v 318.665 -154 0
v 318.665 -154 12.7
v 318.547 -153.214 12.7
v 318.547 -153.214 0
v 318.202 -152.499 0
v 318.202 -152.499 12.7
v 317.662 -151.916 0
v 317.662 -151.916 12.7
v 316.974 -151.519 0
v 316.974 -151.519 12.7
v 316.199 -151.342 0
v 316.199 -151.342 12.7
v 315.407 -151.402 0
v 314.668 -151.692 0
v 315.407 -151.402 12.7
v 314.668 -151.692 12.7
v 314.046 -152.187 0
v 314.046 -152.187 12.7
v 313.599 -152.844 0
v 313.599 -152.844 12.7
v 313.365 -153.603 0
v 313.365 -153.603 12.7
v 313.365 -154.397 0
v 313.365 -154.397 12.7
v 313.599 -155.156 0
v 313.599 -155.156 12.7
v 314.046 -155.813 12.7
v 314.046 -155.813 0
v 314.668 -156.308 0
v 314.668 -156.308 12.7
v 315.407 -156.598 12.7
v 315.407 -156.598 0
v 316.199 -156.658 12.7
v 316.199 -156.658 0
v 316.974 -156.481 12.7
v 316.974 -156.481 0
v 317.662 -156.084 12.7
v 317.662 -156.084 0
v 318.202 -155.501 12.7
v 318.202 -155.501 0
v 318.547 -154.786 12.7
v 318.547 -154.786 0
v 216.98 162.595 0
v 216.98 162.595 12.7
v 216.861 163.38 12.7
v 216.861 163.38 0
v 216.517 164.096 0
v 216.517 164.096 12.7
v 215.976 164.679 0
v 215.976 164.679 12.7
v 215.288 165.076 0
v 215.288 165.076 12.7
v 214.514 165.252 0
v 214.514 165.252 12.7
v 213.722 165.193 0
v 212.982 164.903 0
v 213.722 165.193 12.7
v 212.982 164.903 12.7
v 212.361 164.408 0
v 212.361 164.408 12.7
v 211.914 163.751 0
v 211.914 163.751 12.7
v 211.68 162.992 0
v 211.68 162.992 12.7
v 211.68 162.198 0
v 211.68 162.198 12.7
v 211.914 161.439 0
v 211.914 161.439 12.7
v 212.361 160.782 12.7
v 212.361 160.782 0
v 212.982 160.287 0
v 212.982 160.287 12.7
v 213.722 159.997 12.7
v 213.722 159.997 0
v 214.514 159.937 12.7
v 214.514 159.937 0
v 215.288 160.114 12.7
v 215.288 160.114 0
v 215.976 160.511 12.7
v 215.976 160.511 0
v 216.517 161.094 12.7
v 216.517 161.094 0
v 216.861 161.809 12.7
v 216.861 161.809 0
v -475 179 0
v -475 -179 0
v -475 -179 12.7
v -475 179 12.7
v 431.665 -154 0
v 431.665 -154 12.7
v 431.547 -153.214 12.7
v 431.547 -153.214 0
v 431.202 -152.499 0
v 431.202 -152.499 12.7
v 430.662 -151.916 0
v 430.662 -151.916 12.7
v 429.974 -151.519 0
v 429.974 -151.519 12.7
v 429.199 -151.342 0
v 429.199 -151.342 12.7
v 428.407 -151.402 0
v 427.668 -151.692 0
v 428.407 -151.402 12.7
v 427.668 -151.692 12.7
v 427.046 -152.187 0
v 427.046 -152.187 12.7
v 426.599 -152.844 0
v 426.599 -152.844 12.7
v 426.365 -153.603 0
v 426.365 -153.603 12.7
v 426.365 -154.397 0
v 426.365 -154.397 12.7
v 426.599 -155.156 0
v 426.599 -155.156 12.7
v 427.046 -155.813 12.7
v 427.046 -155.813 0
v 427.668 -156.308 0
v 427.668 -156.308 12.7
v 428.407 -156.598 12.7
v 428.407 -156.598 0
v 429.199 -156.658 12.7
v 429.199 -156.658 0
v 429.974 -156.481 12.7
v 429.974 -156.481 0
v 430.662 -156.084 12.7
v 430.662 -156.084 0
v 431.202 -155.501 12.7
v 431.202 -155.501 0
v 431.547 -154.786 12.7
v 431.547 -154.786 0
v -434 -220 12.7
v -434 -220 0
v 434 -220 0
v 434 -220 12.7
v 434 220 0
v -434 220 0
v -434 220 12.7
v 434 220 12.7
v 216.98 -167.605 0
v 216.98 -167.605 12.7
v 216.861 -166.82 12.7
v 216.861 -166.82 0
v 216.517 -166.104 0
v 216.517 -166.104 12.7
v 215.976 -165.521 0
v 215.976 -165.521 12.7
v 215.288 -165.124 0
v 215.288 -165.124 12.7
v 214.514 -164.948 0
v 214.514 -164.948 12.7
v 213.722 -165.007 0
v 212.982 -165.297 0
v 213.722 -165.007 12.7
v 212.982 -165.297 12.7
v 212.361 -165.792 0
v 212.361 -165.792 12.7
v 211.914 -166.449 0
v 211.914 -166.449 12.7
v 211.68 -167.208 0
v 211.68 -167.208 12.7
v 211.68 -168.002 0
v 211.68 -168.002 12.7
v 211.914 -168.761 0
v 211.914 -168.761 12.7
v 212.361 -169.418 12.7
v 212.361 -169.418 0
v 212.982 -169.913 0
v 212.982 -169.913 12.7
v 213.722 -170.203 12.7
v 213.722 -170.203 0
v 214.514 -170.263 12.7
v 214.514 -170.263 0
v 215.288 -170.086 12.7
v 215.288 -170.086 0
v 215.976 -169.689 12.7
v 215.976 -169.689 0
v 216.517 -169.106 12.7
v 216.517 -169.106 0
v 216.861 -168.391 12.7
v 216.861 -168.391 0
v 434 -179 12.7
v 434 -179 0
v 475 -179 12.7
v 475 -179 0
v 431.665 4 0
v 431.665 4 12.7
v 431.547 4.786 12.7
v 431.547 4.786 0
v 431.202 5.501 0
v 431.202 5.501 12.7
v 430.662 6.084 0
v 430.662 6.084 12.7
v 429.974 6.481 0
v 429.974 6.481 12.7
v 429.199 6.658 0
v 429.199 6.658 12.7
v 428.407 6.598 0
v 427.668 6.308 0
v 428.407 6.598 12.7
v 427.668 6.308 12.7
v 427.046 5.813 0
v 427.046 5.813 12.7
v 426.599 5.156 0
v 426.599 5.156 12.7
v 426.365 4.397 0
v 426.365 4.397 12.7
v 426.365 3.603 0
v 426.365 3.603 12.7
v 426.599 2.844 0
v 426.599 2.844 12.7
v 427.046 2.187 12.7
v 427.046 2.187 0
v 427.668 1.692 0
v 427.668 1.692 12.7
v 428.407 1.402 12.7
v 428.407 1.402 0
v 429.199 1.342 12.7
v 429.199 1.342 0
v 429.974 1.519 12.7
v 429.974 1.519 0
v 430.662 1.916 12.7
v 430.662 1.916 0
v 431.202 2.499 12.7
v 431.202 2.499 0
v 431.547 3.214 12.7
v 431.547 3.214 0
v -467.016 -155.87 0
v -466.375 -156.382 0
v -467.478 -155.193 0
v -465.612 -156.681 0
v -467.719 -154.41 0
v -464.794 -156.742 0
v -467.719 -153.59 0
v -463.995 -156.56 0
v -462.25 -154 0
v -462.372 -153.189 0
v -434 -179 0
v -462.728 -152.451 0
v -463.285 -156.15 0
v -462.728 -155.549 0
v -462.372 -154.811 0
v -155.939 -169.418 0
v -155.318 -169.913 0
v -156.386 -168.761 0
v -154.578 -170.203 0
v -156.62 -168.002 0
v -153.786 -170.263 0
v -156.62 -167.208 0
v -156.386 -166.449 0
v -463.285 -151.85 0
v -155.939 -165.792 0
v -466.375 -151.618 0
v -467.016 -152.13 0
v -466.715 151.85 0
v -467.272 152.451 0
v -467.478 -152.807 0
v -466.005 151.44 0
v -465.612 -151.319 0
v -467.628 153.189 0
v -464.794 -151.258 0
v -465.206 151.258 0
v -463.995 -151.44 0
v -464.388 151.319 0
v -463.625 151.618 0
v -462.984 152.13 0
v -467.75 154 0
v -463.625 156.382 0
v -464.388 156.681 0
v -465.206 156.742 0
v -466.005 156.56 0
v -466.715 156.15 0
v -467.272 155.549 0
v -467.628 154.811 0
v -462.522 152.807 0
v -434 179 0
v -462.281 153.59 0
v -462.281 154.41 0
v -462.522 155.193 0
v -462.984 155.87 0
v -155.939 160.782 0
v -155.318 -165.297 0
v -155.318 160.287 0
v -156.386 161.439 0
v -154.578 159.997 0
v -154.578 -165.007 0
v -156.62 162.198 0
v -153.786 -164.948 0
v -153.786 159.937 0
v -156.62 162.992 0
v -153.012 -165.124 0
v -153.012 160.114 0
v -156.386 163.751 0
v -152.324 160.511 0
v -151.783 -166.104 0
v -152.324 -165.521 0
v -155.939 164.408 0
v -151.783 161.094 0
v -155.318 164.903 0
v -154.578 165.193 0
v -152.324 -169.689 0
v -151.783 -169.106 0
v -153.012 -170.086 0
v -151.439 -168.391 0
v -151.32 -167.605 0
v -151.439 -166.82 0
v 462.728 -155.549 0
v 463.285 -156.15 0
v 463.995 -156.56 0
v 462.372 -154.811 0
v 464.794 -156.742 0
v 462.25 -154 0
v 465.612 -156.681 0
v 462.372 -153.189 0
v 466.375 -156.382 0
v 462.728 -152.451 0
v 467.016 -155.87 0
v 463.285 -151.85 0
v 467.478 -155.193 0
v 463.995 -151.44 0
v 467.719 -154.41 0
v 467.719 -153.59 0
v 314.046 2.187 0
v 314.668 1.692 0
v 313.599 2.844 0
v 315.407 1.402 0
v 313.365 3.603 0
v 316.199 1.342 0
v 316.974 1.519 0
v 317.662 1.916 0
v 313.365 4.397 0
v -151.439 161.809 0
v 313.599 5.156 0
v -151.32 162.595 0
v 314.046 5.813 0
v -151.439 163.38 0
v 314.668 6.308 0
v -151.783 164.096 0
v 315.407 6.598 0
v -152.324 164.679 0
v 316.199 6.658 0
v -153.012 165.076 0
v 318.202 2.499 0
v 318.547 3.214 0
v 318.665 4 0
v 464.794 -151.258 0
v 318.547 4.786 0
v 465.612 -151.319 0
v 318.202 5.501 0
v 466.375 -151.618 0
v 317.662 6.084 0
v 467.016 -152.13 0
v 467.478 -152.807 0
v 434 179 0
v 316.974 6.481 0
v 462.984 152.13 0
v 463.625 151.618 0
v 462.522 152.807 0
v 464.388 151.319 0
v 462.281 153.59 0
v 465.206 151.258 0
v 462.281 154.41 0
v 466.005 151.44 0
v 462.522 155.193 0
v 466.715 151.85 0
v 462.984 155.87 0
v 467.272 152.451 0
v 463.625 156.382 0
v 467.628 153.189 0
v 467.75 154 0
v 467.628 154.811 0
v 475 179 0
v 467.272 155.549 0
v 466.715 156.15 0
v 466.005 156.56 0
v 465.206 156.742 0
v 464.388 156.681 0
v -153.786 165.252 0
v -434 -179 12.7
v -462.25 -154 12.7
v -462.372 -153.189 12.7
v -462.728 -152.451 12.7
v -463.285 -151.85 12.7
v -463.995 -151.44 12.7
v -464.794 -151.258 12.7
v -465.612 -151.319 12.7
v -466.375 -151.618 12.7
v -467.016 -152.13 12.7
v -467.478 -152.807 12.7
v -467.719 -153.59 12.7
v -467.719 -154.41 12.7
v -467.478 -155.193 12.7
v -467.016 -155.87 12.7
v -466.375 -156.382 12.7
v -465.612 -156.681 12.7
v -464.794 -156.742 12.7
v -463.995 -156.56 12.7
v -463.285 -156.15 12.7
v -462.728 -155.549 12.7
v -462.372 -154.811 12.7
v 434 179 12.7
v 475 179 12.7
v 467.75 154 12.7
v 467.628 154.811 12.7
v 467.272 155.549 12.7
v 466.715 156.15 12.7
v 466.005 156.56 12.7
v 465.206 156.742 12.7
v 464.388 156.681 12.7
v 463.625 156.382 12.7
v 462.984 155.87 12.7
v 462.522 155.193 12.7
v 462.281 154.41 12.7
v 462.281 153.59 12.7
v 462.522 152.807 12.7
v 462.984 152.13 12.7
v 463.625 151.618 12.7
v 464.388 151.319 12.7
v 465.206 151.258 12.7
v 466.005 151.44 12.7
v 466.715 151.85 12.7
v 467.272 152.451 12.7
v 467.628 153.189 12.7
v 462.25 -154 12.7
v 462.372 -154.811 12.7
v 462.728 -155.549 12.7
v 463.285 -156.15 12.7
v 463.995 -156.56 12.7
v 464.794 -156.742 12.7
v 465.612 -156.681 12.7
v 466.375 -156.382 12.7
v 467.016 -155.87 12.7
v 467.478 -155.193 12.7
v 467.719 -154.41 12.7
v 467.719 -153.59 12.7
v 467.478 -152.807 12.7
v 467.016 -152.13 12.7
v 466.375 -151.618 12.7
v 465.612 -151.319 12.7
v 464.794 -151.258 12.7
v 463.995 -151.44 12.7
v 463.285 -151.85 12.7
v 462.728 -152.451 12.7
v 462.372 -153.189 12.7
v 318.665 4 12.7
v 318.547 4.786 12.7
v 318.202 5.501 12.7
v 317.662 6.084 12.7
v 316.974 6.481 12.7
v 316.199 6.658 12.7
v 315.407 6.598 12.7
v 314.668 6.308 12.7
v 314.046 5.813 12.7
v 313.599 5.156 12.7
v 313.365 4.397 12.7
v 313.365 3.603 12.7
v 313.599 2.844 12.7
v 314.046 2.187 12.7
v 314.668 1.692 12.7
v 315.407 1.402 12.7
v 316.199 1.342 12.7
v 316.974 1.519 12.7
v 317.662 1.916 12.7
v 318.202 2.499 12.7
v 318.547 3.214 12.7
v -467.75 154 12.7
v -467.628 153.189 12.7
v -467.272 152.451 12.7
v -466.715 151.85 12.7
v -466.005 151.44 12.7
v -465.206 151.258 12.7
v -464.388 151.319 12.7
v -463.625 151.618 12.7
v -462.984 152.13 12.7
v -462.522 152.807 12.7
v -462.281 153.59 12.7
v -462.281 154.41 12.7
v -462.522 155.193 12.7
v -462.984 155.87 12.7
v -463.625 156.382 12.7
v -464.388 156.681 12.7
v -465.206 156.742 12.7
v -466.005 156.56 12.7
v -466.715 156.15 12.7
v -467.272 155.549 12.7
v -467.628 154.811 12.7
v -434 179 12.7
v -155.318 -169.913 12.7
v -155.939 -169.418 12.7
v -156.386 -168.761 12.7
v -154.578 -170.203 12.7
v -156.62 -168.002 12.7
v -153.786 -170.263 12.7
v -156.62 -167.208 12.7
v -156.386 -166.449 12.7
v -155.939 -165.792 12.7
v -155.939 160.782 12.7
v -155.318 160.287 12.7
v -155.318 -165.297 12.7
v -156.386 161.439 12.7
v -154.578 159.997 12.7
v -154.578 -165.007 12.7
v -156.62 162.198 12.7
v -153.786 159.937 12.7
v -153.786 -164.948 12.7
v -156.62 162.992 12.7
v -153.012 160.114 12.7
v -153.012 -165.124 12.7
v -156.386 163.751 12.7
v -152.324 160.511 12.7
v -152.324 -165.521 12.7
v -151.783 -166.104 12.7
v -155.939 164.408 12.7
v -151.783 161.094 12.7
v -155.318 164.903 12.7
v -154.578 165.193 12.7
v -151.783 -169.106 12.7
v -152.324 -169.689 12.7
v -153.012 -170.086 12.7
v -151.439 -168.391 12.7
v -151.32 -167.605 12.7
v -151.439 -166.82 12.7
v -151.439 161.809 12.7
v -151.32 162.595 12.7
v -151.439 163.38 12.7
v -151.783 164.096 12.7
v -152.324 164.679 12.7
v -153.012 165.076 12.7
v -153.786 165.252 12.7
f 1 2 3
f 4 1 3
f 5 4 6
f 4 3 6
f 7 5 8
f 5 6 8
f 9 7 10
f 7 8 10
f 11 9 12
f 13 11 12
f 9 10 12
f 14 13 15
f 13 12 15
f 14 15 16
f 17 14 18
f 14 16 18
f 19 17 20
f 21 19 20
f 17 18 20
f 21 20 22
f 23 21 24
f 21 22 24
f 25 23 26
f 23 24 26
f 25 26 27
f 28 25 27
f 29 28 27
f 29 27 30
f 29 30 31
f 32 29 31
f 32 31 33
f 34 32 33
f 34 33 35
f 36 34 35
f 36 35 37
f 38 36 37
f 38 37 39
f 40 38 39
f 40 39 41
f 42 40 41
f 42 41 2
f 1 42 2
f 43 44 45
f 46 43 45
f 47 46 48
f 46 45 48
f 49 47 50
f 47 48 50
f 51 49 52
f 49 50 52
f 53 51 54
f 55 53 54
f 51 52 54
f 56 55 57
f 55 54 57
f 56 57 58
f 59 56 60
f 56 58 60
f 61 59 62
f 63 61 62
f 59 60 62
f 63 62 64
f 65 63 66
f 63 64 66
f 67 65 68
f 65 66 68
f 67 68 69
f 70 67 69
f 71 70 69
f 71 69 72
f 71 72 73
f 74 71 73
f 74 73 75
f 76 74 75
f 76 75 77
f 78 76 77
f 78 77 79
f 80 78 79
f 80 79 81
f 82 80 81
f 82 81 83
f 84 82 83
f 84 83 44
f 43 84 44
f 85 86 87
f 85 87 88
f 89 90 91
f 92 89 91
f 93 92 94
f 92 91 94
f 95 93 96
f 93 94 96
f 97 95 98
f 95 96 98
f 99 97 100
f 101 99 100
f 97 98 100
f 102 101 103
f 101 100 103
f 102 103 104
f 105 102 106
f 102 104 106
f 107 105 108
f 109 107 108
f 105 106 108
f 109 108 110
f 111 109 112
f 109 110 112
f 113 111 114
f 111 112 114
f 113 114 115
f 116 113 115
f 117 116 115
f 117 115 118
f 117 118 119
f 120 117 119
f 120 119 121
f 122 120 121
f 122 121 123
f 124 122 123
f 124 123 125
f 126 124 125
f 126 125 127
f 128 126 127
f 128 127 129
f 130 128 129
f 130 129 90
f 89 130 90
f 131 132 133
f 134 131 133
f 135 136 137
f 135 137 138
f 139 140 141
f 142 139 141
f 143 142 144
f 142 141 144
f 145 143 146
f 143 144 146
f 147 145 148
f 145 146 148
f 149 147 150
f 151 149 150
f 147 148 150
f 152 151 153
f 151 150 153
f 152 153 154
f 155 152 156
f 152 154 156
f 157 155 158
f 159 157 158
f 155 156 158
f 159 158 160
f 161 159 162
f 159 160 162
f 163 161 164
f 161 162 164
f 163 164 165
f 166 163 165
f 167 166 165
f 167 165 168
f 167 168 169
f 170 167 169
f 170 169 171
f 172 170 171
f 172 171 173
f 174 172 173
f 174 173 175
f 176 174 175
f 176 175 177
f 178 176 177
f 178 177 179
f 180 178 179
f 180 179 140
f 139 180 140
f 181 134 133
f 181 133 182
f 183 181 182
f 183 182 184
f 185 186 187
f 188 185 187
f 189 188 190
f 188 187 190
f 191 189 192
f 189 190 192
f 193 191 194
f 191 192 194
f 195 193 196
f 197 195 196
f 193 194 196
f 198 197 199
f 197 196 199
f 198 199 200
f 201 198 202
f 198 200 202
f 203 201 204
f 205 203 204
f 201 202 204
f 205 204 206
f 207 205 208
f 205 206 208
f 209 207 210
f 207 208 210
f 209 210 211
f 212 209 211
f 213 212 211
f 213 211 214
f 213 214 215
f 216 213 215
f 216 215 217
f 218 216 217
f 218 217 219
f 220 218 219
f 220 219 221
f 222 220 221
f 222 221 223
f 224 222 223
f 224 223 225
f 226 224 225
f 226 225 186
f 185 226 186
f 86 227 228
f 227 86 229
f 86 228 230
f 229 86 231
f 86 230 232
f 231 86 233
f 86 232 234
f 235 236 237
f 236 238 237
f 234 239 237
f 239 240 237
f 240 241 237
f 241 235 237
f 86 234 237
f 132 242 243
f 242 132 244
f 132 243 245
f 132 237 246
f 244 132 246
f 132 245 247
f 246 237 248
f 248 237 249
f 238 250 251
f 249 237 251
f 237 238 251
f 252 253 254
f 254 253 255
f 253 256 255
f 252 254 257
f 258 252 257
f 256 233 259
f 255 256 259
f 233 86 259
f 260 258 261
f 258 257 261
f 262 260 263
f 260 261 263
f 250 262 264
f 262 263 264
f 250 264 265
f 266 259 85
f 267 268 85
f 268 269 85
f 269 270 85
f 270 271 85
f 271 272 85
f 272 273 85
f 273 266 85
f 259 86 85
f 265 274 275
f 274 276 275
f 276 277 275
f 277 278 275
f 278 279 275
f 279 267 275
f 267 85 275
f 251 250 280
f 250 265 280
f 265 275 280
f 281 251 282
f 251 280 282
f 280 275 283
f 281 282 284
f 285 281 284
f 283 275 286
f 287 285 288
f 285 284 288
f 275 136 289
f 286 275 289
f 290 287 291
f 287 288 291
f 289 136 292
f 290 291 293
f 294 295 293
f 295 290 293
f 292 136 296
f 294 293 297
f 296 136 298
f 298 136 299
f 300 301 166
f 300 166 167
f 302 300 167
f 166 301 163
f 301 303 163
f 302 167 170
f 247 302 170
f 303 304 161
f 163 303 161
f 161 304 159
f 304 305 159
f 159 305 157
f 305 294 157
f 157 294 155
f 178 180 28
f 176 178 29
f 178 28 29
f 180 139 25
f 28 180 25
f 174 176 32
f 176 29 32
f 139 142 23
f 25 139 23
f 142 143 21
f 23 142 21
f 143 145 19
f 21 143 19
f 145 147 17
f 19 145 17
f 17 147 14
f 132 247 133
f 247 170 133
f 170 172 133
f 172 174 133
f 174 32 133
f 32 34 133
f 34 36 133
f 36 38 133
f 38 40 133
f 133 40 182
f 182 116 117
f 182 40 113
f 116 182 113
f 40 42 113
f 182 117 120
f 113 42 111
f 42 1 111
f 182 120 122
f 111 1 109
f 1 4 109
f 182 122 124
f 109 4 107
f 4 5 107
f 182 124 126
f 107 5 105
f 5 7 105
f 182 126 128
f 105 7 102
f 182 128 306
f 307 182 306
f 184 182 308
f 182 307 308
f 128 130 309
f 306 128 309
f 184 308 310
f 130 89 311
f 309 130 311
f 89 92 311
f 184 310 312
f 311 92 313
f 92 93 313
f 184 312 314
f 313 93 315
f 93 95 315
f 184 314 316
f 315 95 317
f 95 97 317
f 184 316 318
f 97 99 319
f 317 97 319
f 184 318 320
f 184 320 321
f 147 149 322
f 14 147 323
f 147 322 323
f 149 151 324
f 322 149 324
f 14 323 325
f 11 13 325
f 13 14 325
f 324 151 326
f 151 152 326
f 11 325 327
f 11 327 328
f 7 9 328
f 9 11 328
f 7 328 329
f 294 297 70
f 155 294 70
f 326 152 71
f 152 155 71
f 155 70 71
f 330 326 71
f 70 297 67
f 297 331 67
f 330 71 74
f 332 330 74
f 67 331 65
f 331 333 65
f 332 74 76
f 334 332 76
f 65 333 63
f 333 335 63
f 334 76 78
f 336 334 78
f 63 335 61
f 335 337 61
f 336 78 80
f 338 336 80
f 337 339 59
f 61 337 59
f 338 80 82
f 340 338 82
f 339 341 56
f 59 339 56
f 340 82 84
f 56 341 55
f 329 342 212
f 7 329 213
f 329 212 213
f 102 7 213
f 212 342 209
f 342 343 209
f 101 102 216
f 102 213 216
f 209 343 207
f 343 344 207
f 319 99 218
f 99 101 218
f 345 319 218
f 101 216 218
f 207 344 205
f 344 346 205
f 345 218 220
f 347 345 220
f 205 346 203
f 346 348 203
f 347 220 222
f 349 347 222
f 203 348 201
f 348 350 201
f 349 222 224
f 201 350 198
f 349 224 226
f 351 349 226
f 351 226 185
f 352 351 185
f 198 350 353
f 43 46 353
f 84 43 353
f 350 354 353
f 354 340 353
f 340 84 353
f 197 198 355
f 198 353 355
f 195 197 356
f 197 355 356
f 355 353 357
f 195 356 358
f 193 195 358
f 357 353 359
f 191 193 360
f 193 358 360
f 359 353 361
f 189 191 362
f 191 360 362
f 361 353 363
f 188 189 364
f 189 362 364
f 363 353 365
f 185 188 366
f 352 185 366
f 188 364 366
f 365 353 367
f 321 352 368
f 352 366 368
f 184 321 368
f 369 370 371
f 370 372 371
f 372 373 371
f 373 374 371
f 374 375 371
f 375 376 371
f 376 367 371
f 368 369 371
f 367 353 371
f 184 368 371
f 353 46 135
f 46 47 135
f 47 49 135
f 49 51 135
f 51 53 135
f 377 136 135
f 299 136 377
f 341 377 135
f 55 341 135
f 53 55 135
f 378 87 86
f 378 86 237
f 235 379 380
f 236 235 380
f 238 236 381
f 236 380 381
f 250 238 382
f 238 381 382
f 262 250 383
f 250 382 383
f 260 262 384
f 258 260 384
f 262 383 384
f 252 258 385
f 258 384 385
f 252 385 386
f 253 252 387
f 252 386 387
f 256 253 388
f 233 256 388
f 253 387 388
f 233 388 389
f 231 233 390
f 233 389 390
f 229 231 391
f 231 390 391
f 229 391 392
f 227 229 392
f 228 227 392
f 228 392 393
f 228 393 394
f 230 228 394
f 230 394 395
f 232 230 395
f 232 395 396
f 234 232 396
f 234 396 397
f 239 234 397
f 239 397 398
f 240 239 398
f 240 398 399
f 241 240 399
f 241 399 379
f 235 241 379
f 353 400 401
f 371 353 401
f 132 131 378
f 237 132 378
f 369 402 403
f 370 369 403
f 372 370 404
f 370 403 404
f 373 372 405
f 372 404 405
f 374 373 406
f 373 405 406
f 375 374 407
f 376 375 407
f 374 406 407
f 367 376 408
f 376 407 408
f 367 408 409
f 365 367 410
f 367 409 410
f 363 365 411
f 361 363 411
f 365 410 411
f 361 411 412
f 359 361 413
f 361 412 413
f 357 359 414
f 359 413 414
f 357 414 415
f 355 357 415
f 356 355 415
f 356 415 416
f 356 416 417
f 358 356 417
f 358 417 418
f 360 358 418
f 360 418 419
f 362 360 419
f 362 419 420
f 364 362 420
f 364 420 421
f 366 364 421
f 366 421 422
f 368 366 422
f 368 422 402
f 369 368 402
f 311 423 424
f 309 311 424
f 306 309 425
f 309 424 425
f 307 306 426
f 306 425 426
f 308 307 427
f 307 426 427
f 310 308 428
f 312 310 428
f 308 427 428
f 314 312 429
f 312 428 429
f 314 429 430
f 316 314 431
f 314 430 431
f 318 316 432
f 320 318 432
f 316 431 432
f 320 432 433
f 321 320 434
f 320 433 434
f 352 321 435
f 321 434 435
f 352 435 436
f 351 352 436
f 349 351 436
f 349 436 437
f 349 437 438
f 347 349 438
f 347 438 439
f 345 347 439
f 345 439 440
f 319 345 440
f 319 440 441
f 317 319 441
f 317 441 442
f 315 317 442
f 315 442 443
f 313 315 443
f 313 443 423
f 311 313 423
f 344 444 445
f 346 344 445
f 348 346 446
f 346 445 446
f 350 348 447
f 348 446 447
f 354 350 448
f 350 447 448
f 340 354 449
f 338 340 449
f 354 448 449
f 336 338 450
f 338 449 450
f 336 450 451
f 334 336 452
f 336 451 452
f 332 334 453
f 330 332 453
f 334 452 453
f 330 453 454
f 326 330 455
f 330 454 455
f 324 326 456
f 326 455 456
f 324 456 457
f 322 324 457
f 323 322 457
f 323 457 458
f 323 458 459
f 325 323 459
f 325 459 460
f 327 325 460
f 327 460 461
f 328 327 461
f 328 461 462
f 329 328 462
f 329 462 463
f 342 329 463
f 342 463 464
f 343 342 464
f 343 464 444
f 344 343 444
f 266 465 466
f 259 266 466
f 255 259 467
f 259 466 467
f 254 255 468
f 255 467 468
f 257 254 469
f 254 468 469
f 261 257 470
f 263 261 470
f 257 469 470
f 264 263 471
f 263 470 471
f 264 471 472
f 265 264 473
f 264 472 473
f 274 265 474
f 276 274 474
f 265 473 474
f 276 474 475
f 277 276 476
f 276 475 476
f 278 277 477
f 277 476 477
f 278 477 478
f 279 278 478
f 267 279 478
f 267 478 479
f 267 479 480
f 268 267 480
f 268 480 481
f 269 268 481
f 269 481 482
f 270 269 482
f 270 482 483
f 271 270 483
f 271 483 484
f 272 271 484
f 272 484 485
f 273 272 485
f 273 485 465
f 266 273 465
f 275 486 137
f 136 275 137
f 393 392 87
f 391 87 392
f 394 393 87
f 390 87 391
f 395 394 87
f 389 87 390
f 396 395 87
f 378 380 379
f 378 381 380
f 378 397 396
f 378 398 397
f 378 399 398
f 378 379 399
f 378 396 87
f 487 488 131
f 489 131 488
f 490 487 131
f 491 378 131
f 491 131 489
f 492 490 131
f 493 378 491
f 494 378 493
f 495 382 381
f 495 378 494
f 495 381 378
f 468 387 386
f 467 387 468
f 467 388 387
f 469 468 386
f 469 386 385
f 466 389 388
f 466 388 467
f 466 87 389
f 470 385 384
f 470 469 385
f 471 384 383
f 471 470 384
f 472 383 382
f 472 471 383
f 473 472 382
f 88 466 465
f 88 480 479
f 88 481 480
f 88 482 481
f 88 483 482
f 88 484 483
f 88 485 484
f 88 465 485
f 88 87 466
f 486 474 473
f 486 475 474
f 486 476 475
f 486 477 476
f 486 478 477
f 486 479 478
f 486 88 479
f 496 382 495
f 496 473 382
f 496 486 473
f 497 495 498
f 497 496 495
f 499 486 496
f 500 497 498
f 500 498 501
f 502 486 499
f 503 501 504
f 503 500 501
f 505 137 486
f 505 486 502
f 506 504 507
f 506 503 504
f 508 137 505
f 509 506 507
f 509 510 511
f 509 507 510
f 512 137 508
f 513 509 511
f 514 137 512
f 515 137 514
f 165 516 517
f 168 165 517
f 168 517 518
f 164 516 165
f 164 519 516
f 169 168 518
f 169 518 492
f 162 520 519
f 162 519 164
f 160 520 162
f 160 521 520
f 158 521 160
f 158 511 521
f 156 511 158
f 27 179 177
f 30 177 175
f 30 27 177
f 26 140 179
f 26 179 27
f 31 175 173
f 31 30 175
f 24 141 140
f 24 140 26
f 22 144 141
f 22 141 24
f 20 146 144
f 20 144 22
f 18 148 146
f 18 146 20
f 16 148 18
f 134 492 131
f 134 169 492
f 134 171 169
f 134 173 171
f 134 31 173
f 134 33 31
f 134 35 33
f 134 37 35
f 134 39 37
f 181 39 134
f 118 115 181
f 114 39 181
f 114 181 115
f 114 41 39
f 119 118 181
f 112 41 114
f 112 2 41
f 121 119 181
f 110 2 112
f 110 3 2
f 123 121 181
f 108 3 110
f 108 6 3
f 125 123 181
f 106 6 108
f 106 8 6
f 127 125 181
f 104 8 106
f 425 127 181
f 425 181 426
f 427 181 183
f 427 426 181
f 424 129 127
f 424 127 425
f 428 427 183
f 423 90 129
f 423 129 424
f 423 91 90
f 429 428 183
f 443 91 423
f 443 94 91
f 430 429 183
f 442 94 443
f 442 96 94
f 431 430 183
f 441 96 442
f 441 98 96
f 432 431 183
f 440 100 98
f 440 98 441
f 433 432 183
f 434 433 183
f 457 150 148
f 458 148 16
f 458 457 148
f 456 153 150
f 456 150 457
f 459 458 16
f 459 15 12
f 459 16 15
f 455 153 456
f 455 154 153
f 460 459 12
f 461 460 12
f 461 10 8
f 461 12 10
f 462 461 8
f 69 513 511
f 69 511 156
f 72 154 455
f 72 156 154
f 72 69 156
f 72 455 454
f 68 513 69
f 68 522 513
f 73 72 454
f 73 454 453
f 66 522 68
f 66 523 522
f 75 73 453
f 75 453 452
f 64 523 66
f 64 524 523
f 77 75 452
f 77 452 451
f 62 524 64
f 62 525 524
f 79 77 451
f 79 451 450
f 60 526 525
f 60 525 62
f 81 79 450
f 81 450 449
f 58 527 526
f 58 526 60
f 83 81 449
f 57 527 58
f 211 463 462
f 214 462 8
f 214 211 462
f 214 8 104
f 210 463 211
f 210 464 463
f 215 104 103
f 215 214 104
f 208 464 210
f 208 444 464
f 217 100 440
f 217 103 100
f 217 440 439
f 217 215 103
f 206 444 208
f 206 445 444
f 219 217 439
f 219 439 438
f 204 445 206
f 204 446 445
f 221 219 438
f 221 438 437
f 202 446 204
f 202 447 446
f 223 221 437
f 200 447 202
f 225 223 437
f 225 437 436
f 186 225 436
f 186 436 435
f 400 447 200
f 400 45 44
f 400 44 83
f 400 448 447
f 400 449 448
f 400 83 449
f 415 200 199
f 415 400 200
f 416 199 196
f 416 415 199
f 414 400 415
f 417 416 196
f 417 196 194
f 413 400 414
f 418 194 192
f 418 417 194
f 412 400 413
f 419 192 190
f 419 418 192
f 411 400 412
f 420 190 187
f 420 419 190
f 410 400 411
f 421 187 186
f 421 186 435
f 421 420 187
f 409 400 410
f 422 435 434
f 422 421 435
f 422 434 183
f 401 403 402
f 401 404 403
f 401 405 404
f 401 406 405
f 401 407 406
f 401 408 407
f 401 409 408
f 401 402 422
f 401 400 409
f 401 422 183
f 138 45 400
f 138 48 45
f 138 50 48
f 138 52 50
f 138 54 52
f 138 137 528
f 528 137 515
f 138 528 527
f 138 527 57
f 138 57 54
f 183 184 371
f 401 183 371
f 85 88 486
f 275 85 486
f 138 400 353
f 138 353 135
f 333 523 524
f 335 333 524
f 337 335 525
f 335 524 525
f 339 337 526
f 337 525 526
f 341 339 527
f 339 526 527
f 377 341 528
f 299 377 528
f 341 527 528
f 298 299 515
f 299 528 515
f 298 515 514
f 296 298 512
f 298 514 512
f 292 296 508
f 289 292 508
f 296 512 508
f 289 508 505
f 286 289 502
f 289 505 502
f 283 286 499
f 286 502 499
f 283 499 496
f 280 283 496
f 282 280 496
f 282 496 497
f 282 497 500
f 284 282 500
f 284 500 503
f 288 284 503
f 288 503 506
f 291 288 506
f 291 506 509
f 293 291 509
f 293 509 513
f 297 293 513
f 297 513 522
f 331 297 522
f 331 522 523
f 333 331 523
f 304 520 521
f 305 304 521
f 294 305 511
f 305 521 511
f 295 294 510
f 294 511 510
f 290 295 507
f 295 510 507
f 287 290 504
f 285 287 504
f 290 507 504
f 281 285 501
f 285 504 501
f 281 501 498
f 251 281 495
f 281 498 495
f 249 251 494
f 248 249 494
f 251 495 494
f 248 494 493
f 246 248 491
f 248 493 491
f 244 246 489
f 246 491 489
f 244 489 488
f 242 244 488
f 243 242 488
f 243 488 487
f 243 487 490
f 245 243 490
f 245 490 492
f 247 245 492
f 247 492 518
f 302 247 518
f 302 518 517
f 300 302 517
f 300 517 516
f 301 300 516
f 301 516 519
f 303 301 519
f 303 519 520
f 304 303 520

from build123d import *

# Parameters (mm, degrees)
SKETCH2_W           = 950
SKETCH2_H           = 440
BOSS_EXTRUDE1_DEPTH = 12.7
CUT_EXTRUDE1_REACH  = 525.628
SKETCH3_W           = 41
SKETCH3_H           = 41
CUT_EXTRUDE2_REACH  = 525.628
SKETCH4_R           = 2.75
CUT_EXTRUDE3_REACH  = 525.628
SKETCH6_R           = 2.665
CUT_EXTRUDE4_REACH  = 525.628
SKETCH7_R           = 2.665


with BuildPart() as part:
    # Sketch2 → Boss-Extrude1 (new body)
    with BuildSketch(Plane.XY):
        Rectangle(SKETCH2_W, SKETCH2_H)
    extrude(amount=BOSS_EXTRUDE1_DEPTH)

    # Sketch3 → Cut-Extrude1 (cut, up to next)
    with BuildSketch(Plane.XY.offset(12.7), mode=Mode.PRIVATE) as cut_extrude1_sk1:
        with Locations((-454.5, 199.5)):
            Rectangle(SKETCH3_W, SKETCH3_H)
    cut_extrude1_tool1 = extrude(cut_extrude1_sk1.sketch, amount=-CUT_EXTRUDE1_REACH, mode=Mode.PRIVATE) & part.part
    # Sketch3 → Cut-Extrude1 (cut, up to next)
    with BuildSketch(Plane.XY.offset(12.7), mode=Mode.PRIVATE) as cut_extrude1_sk2:
        with Locations((454.5, 199.5)):
            Rectangle(SKETCH3_W, SKETCH3_H)
    cut_extrude1_tool2 = extrude(cut_extrude1_sk2.sketch, amount=-CUT_EXTRUDE1_REACH, mode=Mode.PRIVATE) & part.part
    # Sketch3 → Cut-Extrude1 (cut, up to next)
    with BuildSketch(Plane.XY.offset(12.7), mode=Mode.PRIVATE) as cut_extrude1_sk3:
        with Locations((454.5, -199.5)):
            Rectangle(SKETCH3_W, SKETCH3_H)
    cut_extrude1_tool3 = extrude(cut_extrude1_sk3.sketch, amount=-CUT_EXTRUDE1_REACH, mode=Mode.PRIVATE) & part.part
    # Sketch3 → Cut-Extrude1 (cut, up to next)
    with BuildSketch(Plane.XY.offset(12.7), mode=Mode.PRIVATE) as cut_extrude1_sk4:
        with Locations((-454.5, -199.5)):
            Rectangle(SKETCH3_W, SKETCH3_H)
    cut_extrude1_tool4 = extrude(cut_extrude1_sk4.sketch, amount=-CUT_EXTRUDE1_REACH, mode=Mode.PRIVATE) & part.part
    add(cut_extrude1_tool1.solids().sort_by_distance((-454.5, 199.5, 12.7))[0], mode=Mode.SUBTRACT)
    add(cut_extrude1_tool2.solids().sort_by_distance((454.5, 199.5, 12.7))[0], mode=Mode.SUBTRACT)
    add(cut_extrude1_tool3.solids().sort_by_distance((454.5, -199.5, 12.7))[0], mode=Mode.SUBTRACT)
    add(cut_extrude1_tool4.solids().sort_by_distance((-454.5, -199.5, 12.7))[0], mode=Mode.SUBTRACT)

    # Sketch4 → Cut-Extrude2 (cut, up to next)
    with BuildSketch(Plane.XY.offset(12.7), mode=Mode.PRIVATE) as cut_extrude2_sk1:
        with Locations((-465, -154)):
            Circle(SKETCH4_R)
    cut_extrude2_tool1 = extrude(cut_extrude2_sk1.sketch, amount=-CUT_EXTRUDE2_REACH, mode=Mode.PRIVATE) & part.part
    # Sketch4 → Cut-Extrude2 (cut, up to next)
    with BuildSketch(Plane.XY.offset(12.7), mode=Mode.PRIVATE) as cut_extrude2_sk2:
        with Locations(Location((-465, 154, 0), (0, 0, 180))):
            Circle(SKETCH4_R)
    cut_extrude2_tool2 = extrude(cut_extrude2_sk2.sketch, amount=-CUT_EXTRUDE2_REACH, mode=Mode.PRIVATE) & part.part
    # Sketch4 → Cut-Extrude2 (cut, up to next)
    with BuildSketch(Plane.XY.offset(12.7), mode=Mode.PRIVATE) as cut_extrude2_sk3:
        with Locations(Location((465, -154, 0), (0, 0, 180))):
            Circle(SKETCH4_R)
    cut_extrude2_tool3 = extrude(cut_extrude2_sk3.sketch, amount=-CUT_EXTRUDE2_REACH, mode=Mode.PRIVATE) & part.part
    # Sketch4 → Cut-Extrude2 (cut, up to next)
    with BuildSketch(Plane.XY.offset(12.7), mode=Mode.PRIVATE) as cut_extrude2_sk4:
        with Locations((465, 154)):
            Circle(SKETCH4_R)
    cut_extrude2_tool4 = extrude(cut_extrude2_sk4.sketch, amount=-CUT_EXTRUDE2_REACH, mode=Mode.PRIVATE) & part.part
    add(cut_extrude2_tool1.solids().sort_by_distance((-465, -154, 12.7))[0], mode=Mode.SUBTRACT)
    add(cut_extrude2_tool2.solids().sort_by_distance((-465, 154, 12.7))[0], mode=Mode.SUBTRACT)
    add(cut_extrude2_tool3.solids().sort_by_distance((465, -154, 12.7))[0], mode=Mode.SUBTRACT)
    add(cut_extrude2_tool4.solids().sort_by_distance((465, 154, 12.7))[0], mode=Mode.SUBTRACT)

    # Sketch6 → Cut-Extrude3 (cut, up to next)
    with BuildSketch(Plane.XY.offset(12.7), mode=Mode.PRIVATE) as cut_extrude3_sk1:
        with Locations((-153.985226099, -167.605059616)):
            Circle(SKETCH6_R)
    cut_extrude3_tool1 = extrude(cut_extrude3_sk1.sketch, amount=-CUT_EXTRUDE3_REACH, mode=Mode.PRIVATE) & part.part
    # Sketch6 → Cut-Extrude3 (cut, up to next)
    with BuildSketch(Plane.XY.offset(12.7), mode=Mode.PRIVATE) as cut_extrude3_sk2:
        with Locations((214.314773901, -167.605059616)):
            Circle(SKETCH6_R)
    cut_extrude3_tool2 = extrude(cut_extrude3_sk2.sketch, amount=-CUT_EXTRUDE3_REACH, mode=Mode.PRIVATE) & part.part
    # Sketch6 → Cut-Extrude3 (cut, up to next)
    with BuildSketch(Plane.XY.offset(12.7), mode=Mode.PRIVATE) as cut_extrude3_sk3:
        with Locations((214.314773901, 162.594940384)):
            Circle(SKETCH6_R)
    cut_extrude3_tool3 = extrude(cut_extrude3_sk3.sketch, amount=-CUT_EXTRUDE3_REACH, mode=Mode.PRIVATE) & part.part
    # Sketch6 → Cut-Extrude3 (cut, up to next)
    with BuildSketch(Plane.XY.offset(12.7), mode=Mode.PRIVATE) as cut_extrude3_sk4:
        with Locations((-153.985226099, 162.594940384)):
            Circle(SKETCH6_R)
    cut_extrude3_tool4 = extrude(cut_extrude3_sk4.sketch, amount=-CUT_EXTRUDE3_REACH, mode=Mode.PRIVATE) & part.part
    add(cut_extrude3_tool1.solids().sort_by_distance((-153.985226, -167.60506, 12.7))[0], mode=Mode.SUBTRACT)
    add(cut_extrude3_tool2.solids().sort_by_distance((214.314774, -167.60506, 12.7))[0], mode=Mode.SUBTRACT)
    add(cut_extrude3_tool3.solids().sort_by_distance((214.314774, 162.59494, 12.7))[0], mode=Mode.SUBTRACT)
    add(cut_extrude3_tool4.solids().sort_by_distance((-153.985226, 162.59494, 12.7))[0], mode=Mode.SUBTRACT)

    # Sketch7 → Cut-Extrude4 (cut, up to next)
    with BuildSketch(Plane.XY.offset(12.7), mode=Mode.PRIVATE) as cut_extrude4_sk1:
        with Locations((429, 4)):
            Circle(SKETCH7_R)
    cut_extrude4_tool1 = extrude(cut_extrude4_sk1.sketch, amount=-CUT_EXTRUDE4_REACH, mode=Mode.PRIVATE) & part.part
    # Sketch7 → Cut-Extrude4 (cut, up to next)
    with BuildSketch(Plane.XY.offset(12.7), mode=Mode.PRIVATE) as cut_extrude4_sk2:
        with Locations((429, -154)):
            Circle(SKETCH7_R)
    cut_extrude4_tool2 = extrude(cut_extrude4_sk2.sketch, amount=-CUT_EXTRUDE4_REACH, mode=Mode.PRIVATE) & part.part
    # Sketch7 → Cut-Extrude4 (cut, up to next)
    with BuildSketch(Plane.XY.offset(12.7), mode=Mode.PRIVATE) as cut_extrude4_sk3:
        with Locations((316, 4)):
            Circle(SKETCH7_R)
    cut_extrude4_tool3 = extrude(cut_extrude4_sk3.sketch, amount=-CUT_EXTRUDE4_REACH, mode=Mode.PRIVATE) & part.part
    # Sketch7 → Cut-Extrude4 (cut, up to next)
    with BuildSketch(Plane.XY.offset(12.7), mode=Mode.PRIVATE) as cut_extrude4_sk4:
        with Locations((316, -154)):
            Circle(SKETCH7_R)
    cut_extrude4_tool4 = extrude(cut_extrude4_sk4.sketch, amount=-CUT_EXTRUDE4_REACH, mode=Mode.PRIVATE) & part.part
    add(cut_extrude4_tool1.solids().sort_by_distance((429, 4, 12.7))[0], mode=Mode.SUBTRACT)
    add(cut_extrude4_tool2.solids().sort_by_distance((429, -154, 12.7))[0], mode=Mode.SUBTRACT)
    add(cut_extrude4_tool3.solids().sort_by_distance((316, 4, 12.7))[0], mode=Mode.SUBTRACT)
    add(cut_extrude4_tool4.solids().sort_by_distance((316, -154, 12.7))[0], mode=Mode.SUBTRACT)


solid = part.part
